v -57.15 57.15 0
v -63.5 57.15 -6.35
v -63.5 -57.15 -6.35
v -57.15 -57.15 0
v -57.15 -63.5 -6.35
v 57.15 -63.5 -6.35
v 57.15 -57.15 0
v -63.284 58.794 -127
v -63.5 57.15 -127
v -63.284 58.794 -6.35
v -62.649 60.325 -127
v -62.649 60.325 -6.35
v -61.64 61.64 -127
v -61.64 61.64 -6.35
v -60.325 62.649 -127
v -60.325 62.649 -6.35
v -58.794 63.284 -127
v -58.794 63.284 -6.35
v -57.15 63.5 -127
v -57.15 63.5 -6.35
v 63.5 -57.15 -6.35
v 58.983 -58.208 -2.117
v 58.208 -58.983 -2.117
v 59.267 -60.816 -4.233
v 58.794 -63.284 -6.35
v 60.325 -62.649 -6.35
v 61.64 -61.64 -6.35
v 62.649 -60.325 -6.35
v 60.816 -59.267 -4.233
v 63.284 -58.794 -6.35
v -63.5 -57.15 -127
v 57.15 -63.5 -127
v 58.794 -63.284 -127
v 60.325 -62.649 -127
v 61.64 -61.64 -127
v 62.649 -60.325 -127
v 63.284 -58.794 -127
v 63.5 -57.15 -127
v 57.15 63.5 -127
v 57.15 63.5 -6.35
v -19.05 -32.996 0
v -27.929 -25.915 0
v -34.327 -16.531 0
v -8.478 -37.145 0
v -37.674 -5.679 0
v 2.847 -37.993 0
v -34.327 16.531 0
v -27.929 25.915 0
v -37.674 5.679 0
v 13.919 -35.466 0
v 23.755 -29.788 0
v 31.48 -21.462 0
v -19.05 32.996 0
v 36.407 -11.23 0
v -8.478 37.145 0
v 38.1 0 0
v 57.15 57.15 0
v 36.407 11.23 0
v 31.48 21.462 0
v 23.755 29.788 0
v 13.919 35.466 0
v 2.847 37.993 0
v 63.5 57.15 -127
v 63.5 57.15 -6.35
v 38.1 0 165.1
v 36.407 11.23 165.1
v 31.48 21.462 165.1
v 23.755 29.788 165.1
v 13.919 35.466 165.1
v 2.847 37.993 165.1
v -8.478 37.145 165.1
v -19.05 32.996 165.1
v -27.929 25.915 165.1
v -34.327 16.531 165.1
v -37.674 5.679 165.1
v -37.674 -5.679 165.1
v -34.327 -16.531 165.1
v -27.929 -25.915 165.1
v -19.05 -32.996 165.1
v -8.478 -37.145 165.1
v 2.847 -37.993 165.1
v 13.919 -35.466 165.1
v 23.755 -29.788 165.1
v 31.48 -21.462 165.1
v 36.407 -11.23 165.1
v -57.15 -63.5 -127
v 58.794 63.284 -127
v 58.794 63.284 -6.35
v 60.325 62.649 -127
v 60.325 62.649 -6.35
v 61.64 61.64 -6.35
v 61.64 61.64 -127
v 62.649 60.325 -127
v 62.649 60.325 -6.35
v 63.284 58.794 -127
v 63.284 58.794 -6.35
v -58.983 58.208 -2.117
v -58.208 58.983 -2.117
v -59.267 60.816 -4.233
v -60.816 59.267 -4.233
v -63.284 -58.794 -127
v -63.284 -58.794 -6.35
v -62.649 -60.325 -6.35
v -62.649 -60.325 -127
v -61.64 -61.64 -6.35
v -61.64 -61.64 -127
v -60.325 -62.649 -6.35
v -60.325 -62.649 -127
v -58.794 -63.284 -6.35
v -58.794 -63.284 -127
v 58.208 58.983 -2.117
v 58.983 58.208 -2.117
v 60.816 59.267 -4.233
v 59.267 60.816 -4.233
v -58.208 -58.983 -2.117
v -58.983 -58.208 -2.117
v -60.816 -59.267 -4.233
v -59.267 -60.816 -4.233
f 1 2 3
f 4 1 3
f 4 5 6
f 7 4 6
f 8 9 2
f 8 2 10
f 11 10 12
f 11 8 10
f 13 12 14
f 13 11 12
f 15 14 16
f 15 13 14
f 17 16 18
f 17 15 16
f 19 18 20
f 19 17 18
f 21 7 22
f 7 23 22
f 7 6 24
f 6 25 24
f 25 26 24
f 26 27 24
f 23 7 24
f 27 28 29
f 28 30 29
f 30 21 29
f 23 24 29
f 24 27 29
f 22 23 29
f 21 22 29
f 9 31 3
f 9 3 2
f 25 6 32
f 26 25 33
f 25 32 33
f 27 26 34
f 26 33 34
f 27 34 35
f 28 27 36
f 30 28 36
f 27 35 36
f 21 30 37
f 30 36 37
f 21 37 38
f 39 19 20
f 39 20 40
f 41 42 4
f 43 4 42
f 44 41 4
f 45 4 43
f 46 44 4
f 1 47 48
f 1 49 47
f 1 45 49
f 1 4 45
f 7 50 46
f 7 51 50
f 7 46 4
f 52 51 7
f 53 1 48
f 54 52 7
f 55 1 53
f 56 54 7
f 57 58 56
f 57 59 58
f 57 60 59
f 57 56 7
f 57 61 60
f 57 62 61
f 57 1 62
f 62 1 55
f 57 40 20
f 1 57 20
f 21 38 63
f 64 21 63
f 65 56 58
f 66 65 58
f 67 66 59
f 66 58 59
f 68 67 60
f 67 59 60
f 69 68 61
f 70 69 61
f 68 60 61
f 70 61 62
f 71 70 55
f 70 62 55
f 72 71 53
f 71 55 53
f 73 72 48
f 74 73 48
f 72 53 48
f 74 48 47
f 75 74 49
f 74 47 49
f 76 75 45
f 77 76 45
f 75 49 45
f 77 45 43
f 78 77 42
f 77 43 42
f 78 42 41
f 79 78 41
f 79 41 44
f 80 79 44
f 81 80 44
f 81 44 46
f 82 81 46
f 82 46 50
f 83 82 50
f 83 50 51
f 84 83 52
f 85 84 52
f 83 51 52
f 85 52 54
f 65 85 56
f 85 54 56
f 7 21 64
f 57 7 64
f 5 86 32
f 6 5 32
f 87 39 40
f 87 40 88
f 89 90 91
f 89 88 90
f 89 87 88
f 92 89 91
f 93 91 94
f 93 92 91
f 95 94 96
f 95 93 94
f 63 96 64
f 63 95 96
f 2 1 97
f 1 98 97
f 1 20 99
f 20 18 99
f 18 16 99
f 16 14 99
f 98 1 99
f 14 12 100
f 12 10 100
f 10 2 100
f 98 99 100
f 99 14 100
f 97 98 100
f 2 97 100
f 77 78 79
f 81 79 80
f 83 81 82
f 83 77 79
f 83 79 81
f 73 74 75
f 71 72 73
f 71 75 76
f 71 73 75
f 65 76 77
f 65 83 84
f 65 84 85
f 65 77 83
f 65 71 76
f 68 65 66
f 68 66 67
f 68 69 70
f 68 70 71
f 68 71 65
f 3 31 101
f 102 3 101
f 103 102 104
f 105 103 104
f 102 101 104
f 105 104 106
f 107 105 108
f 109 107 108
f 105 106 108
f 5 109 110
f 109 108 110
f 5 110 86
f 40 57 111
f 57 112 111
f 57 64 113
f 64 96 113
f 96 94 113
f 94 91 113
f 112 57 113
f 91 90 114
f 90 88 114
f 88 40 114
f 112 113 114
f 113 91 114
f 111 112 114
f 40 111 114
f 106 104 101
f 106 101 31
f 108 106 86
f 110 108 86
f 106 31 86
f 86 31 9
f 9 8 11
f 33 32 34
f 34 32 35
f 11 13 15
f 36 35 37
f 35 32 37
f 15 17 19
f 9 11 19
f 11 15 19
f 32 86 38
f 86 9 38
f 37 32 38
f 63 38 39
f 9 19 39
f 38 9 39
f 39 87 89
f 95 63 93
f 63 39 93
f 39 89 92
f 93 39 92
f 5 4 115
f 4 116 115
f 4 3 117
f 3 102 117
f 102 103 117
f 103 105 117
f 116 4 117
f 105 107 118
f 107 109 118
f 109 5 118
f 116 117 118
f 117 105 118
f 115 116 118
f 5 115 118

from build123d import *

# Parameters (mm, degrees)
F0_W     = 127
F0_H     = 127
F0_R     = 38.1
F1_DEPTH = 127
F2_DEPTH = 165.1
F3_R     = 6.35
F4_SIZE  = 6.34999


# Not quite as in the source:
# - a fillet or chamfer is up to 0.001 mm smaller than in the source, because OpenCascade refuses the exact size


with BuildPart() as f1:
    # F0 (on Top) → F1 (new body)
    with BuildSketch(Plane.XY):
        Rectangle(F0_W, F0_H)
        Circle(F0_R, mode=Mode.SUBTRACT)
        Circle(F0_R)
    extrude(amount=-F1_DEPTH)

    # F0 (on Top) → F2 (join)
    with BuildSketch(Plane.XY):
        Circle(F0_R)
    extrude(amount=F2_DEPTH)

    # F3
    f3_edges = [f1.edges().sort_by_distance(p)[0] for p in [
        (-63.5, -63.5, -63.5),
        (63.5, -63.5, -63.5),
        (63.5, 63.5, -63.5),
        (-63.5, 63.5, -63.5),
    ]]
    fillet(f3_edges, radius=F3_R)

    # F4 (size 6.35 in the source; OpenCascade refuses exactly that, so slightly less here)
    f4_edges = [f1.edges().sort_by_distance(p)[0] for p in [
        (0, -63.5, 0),
    ]]
    chamfer(f4_edges, length=F4_SIZE)


solid = f1.part
